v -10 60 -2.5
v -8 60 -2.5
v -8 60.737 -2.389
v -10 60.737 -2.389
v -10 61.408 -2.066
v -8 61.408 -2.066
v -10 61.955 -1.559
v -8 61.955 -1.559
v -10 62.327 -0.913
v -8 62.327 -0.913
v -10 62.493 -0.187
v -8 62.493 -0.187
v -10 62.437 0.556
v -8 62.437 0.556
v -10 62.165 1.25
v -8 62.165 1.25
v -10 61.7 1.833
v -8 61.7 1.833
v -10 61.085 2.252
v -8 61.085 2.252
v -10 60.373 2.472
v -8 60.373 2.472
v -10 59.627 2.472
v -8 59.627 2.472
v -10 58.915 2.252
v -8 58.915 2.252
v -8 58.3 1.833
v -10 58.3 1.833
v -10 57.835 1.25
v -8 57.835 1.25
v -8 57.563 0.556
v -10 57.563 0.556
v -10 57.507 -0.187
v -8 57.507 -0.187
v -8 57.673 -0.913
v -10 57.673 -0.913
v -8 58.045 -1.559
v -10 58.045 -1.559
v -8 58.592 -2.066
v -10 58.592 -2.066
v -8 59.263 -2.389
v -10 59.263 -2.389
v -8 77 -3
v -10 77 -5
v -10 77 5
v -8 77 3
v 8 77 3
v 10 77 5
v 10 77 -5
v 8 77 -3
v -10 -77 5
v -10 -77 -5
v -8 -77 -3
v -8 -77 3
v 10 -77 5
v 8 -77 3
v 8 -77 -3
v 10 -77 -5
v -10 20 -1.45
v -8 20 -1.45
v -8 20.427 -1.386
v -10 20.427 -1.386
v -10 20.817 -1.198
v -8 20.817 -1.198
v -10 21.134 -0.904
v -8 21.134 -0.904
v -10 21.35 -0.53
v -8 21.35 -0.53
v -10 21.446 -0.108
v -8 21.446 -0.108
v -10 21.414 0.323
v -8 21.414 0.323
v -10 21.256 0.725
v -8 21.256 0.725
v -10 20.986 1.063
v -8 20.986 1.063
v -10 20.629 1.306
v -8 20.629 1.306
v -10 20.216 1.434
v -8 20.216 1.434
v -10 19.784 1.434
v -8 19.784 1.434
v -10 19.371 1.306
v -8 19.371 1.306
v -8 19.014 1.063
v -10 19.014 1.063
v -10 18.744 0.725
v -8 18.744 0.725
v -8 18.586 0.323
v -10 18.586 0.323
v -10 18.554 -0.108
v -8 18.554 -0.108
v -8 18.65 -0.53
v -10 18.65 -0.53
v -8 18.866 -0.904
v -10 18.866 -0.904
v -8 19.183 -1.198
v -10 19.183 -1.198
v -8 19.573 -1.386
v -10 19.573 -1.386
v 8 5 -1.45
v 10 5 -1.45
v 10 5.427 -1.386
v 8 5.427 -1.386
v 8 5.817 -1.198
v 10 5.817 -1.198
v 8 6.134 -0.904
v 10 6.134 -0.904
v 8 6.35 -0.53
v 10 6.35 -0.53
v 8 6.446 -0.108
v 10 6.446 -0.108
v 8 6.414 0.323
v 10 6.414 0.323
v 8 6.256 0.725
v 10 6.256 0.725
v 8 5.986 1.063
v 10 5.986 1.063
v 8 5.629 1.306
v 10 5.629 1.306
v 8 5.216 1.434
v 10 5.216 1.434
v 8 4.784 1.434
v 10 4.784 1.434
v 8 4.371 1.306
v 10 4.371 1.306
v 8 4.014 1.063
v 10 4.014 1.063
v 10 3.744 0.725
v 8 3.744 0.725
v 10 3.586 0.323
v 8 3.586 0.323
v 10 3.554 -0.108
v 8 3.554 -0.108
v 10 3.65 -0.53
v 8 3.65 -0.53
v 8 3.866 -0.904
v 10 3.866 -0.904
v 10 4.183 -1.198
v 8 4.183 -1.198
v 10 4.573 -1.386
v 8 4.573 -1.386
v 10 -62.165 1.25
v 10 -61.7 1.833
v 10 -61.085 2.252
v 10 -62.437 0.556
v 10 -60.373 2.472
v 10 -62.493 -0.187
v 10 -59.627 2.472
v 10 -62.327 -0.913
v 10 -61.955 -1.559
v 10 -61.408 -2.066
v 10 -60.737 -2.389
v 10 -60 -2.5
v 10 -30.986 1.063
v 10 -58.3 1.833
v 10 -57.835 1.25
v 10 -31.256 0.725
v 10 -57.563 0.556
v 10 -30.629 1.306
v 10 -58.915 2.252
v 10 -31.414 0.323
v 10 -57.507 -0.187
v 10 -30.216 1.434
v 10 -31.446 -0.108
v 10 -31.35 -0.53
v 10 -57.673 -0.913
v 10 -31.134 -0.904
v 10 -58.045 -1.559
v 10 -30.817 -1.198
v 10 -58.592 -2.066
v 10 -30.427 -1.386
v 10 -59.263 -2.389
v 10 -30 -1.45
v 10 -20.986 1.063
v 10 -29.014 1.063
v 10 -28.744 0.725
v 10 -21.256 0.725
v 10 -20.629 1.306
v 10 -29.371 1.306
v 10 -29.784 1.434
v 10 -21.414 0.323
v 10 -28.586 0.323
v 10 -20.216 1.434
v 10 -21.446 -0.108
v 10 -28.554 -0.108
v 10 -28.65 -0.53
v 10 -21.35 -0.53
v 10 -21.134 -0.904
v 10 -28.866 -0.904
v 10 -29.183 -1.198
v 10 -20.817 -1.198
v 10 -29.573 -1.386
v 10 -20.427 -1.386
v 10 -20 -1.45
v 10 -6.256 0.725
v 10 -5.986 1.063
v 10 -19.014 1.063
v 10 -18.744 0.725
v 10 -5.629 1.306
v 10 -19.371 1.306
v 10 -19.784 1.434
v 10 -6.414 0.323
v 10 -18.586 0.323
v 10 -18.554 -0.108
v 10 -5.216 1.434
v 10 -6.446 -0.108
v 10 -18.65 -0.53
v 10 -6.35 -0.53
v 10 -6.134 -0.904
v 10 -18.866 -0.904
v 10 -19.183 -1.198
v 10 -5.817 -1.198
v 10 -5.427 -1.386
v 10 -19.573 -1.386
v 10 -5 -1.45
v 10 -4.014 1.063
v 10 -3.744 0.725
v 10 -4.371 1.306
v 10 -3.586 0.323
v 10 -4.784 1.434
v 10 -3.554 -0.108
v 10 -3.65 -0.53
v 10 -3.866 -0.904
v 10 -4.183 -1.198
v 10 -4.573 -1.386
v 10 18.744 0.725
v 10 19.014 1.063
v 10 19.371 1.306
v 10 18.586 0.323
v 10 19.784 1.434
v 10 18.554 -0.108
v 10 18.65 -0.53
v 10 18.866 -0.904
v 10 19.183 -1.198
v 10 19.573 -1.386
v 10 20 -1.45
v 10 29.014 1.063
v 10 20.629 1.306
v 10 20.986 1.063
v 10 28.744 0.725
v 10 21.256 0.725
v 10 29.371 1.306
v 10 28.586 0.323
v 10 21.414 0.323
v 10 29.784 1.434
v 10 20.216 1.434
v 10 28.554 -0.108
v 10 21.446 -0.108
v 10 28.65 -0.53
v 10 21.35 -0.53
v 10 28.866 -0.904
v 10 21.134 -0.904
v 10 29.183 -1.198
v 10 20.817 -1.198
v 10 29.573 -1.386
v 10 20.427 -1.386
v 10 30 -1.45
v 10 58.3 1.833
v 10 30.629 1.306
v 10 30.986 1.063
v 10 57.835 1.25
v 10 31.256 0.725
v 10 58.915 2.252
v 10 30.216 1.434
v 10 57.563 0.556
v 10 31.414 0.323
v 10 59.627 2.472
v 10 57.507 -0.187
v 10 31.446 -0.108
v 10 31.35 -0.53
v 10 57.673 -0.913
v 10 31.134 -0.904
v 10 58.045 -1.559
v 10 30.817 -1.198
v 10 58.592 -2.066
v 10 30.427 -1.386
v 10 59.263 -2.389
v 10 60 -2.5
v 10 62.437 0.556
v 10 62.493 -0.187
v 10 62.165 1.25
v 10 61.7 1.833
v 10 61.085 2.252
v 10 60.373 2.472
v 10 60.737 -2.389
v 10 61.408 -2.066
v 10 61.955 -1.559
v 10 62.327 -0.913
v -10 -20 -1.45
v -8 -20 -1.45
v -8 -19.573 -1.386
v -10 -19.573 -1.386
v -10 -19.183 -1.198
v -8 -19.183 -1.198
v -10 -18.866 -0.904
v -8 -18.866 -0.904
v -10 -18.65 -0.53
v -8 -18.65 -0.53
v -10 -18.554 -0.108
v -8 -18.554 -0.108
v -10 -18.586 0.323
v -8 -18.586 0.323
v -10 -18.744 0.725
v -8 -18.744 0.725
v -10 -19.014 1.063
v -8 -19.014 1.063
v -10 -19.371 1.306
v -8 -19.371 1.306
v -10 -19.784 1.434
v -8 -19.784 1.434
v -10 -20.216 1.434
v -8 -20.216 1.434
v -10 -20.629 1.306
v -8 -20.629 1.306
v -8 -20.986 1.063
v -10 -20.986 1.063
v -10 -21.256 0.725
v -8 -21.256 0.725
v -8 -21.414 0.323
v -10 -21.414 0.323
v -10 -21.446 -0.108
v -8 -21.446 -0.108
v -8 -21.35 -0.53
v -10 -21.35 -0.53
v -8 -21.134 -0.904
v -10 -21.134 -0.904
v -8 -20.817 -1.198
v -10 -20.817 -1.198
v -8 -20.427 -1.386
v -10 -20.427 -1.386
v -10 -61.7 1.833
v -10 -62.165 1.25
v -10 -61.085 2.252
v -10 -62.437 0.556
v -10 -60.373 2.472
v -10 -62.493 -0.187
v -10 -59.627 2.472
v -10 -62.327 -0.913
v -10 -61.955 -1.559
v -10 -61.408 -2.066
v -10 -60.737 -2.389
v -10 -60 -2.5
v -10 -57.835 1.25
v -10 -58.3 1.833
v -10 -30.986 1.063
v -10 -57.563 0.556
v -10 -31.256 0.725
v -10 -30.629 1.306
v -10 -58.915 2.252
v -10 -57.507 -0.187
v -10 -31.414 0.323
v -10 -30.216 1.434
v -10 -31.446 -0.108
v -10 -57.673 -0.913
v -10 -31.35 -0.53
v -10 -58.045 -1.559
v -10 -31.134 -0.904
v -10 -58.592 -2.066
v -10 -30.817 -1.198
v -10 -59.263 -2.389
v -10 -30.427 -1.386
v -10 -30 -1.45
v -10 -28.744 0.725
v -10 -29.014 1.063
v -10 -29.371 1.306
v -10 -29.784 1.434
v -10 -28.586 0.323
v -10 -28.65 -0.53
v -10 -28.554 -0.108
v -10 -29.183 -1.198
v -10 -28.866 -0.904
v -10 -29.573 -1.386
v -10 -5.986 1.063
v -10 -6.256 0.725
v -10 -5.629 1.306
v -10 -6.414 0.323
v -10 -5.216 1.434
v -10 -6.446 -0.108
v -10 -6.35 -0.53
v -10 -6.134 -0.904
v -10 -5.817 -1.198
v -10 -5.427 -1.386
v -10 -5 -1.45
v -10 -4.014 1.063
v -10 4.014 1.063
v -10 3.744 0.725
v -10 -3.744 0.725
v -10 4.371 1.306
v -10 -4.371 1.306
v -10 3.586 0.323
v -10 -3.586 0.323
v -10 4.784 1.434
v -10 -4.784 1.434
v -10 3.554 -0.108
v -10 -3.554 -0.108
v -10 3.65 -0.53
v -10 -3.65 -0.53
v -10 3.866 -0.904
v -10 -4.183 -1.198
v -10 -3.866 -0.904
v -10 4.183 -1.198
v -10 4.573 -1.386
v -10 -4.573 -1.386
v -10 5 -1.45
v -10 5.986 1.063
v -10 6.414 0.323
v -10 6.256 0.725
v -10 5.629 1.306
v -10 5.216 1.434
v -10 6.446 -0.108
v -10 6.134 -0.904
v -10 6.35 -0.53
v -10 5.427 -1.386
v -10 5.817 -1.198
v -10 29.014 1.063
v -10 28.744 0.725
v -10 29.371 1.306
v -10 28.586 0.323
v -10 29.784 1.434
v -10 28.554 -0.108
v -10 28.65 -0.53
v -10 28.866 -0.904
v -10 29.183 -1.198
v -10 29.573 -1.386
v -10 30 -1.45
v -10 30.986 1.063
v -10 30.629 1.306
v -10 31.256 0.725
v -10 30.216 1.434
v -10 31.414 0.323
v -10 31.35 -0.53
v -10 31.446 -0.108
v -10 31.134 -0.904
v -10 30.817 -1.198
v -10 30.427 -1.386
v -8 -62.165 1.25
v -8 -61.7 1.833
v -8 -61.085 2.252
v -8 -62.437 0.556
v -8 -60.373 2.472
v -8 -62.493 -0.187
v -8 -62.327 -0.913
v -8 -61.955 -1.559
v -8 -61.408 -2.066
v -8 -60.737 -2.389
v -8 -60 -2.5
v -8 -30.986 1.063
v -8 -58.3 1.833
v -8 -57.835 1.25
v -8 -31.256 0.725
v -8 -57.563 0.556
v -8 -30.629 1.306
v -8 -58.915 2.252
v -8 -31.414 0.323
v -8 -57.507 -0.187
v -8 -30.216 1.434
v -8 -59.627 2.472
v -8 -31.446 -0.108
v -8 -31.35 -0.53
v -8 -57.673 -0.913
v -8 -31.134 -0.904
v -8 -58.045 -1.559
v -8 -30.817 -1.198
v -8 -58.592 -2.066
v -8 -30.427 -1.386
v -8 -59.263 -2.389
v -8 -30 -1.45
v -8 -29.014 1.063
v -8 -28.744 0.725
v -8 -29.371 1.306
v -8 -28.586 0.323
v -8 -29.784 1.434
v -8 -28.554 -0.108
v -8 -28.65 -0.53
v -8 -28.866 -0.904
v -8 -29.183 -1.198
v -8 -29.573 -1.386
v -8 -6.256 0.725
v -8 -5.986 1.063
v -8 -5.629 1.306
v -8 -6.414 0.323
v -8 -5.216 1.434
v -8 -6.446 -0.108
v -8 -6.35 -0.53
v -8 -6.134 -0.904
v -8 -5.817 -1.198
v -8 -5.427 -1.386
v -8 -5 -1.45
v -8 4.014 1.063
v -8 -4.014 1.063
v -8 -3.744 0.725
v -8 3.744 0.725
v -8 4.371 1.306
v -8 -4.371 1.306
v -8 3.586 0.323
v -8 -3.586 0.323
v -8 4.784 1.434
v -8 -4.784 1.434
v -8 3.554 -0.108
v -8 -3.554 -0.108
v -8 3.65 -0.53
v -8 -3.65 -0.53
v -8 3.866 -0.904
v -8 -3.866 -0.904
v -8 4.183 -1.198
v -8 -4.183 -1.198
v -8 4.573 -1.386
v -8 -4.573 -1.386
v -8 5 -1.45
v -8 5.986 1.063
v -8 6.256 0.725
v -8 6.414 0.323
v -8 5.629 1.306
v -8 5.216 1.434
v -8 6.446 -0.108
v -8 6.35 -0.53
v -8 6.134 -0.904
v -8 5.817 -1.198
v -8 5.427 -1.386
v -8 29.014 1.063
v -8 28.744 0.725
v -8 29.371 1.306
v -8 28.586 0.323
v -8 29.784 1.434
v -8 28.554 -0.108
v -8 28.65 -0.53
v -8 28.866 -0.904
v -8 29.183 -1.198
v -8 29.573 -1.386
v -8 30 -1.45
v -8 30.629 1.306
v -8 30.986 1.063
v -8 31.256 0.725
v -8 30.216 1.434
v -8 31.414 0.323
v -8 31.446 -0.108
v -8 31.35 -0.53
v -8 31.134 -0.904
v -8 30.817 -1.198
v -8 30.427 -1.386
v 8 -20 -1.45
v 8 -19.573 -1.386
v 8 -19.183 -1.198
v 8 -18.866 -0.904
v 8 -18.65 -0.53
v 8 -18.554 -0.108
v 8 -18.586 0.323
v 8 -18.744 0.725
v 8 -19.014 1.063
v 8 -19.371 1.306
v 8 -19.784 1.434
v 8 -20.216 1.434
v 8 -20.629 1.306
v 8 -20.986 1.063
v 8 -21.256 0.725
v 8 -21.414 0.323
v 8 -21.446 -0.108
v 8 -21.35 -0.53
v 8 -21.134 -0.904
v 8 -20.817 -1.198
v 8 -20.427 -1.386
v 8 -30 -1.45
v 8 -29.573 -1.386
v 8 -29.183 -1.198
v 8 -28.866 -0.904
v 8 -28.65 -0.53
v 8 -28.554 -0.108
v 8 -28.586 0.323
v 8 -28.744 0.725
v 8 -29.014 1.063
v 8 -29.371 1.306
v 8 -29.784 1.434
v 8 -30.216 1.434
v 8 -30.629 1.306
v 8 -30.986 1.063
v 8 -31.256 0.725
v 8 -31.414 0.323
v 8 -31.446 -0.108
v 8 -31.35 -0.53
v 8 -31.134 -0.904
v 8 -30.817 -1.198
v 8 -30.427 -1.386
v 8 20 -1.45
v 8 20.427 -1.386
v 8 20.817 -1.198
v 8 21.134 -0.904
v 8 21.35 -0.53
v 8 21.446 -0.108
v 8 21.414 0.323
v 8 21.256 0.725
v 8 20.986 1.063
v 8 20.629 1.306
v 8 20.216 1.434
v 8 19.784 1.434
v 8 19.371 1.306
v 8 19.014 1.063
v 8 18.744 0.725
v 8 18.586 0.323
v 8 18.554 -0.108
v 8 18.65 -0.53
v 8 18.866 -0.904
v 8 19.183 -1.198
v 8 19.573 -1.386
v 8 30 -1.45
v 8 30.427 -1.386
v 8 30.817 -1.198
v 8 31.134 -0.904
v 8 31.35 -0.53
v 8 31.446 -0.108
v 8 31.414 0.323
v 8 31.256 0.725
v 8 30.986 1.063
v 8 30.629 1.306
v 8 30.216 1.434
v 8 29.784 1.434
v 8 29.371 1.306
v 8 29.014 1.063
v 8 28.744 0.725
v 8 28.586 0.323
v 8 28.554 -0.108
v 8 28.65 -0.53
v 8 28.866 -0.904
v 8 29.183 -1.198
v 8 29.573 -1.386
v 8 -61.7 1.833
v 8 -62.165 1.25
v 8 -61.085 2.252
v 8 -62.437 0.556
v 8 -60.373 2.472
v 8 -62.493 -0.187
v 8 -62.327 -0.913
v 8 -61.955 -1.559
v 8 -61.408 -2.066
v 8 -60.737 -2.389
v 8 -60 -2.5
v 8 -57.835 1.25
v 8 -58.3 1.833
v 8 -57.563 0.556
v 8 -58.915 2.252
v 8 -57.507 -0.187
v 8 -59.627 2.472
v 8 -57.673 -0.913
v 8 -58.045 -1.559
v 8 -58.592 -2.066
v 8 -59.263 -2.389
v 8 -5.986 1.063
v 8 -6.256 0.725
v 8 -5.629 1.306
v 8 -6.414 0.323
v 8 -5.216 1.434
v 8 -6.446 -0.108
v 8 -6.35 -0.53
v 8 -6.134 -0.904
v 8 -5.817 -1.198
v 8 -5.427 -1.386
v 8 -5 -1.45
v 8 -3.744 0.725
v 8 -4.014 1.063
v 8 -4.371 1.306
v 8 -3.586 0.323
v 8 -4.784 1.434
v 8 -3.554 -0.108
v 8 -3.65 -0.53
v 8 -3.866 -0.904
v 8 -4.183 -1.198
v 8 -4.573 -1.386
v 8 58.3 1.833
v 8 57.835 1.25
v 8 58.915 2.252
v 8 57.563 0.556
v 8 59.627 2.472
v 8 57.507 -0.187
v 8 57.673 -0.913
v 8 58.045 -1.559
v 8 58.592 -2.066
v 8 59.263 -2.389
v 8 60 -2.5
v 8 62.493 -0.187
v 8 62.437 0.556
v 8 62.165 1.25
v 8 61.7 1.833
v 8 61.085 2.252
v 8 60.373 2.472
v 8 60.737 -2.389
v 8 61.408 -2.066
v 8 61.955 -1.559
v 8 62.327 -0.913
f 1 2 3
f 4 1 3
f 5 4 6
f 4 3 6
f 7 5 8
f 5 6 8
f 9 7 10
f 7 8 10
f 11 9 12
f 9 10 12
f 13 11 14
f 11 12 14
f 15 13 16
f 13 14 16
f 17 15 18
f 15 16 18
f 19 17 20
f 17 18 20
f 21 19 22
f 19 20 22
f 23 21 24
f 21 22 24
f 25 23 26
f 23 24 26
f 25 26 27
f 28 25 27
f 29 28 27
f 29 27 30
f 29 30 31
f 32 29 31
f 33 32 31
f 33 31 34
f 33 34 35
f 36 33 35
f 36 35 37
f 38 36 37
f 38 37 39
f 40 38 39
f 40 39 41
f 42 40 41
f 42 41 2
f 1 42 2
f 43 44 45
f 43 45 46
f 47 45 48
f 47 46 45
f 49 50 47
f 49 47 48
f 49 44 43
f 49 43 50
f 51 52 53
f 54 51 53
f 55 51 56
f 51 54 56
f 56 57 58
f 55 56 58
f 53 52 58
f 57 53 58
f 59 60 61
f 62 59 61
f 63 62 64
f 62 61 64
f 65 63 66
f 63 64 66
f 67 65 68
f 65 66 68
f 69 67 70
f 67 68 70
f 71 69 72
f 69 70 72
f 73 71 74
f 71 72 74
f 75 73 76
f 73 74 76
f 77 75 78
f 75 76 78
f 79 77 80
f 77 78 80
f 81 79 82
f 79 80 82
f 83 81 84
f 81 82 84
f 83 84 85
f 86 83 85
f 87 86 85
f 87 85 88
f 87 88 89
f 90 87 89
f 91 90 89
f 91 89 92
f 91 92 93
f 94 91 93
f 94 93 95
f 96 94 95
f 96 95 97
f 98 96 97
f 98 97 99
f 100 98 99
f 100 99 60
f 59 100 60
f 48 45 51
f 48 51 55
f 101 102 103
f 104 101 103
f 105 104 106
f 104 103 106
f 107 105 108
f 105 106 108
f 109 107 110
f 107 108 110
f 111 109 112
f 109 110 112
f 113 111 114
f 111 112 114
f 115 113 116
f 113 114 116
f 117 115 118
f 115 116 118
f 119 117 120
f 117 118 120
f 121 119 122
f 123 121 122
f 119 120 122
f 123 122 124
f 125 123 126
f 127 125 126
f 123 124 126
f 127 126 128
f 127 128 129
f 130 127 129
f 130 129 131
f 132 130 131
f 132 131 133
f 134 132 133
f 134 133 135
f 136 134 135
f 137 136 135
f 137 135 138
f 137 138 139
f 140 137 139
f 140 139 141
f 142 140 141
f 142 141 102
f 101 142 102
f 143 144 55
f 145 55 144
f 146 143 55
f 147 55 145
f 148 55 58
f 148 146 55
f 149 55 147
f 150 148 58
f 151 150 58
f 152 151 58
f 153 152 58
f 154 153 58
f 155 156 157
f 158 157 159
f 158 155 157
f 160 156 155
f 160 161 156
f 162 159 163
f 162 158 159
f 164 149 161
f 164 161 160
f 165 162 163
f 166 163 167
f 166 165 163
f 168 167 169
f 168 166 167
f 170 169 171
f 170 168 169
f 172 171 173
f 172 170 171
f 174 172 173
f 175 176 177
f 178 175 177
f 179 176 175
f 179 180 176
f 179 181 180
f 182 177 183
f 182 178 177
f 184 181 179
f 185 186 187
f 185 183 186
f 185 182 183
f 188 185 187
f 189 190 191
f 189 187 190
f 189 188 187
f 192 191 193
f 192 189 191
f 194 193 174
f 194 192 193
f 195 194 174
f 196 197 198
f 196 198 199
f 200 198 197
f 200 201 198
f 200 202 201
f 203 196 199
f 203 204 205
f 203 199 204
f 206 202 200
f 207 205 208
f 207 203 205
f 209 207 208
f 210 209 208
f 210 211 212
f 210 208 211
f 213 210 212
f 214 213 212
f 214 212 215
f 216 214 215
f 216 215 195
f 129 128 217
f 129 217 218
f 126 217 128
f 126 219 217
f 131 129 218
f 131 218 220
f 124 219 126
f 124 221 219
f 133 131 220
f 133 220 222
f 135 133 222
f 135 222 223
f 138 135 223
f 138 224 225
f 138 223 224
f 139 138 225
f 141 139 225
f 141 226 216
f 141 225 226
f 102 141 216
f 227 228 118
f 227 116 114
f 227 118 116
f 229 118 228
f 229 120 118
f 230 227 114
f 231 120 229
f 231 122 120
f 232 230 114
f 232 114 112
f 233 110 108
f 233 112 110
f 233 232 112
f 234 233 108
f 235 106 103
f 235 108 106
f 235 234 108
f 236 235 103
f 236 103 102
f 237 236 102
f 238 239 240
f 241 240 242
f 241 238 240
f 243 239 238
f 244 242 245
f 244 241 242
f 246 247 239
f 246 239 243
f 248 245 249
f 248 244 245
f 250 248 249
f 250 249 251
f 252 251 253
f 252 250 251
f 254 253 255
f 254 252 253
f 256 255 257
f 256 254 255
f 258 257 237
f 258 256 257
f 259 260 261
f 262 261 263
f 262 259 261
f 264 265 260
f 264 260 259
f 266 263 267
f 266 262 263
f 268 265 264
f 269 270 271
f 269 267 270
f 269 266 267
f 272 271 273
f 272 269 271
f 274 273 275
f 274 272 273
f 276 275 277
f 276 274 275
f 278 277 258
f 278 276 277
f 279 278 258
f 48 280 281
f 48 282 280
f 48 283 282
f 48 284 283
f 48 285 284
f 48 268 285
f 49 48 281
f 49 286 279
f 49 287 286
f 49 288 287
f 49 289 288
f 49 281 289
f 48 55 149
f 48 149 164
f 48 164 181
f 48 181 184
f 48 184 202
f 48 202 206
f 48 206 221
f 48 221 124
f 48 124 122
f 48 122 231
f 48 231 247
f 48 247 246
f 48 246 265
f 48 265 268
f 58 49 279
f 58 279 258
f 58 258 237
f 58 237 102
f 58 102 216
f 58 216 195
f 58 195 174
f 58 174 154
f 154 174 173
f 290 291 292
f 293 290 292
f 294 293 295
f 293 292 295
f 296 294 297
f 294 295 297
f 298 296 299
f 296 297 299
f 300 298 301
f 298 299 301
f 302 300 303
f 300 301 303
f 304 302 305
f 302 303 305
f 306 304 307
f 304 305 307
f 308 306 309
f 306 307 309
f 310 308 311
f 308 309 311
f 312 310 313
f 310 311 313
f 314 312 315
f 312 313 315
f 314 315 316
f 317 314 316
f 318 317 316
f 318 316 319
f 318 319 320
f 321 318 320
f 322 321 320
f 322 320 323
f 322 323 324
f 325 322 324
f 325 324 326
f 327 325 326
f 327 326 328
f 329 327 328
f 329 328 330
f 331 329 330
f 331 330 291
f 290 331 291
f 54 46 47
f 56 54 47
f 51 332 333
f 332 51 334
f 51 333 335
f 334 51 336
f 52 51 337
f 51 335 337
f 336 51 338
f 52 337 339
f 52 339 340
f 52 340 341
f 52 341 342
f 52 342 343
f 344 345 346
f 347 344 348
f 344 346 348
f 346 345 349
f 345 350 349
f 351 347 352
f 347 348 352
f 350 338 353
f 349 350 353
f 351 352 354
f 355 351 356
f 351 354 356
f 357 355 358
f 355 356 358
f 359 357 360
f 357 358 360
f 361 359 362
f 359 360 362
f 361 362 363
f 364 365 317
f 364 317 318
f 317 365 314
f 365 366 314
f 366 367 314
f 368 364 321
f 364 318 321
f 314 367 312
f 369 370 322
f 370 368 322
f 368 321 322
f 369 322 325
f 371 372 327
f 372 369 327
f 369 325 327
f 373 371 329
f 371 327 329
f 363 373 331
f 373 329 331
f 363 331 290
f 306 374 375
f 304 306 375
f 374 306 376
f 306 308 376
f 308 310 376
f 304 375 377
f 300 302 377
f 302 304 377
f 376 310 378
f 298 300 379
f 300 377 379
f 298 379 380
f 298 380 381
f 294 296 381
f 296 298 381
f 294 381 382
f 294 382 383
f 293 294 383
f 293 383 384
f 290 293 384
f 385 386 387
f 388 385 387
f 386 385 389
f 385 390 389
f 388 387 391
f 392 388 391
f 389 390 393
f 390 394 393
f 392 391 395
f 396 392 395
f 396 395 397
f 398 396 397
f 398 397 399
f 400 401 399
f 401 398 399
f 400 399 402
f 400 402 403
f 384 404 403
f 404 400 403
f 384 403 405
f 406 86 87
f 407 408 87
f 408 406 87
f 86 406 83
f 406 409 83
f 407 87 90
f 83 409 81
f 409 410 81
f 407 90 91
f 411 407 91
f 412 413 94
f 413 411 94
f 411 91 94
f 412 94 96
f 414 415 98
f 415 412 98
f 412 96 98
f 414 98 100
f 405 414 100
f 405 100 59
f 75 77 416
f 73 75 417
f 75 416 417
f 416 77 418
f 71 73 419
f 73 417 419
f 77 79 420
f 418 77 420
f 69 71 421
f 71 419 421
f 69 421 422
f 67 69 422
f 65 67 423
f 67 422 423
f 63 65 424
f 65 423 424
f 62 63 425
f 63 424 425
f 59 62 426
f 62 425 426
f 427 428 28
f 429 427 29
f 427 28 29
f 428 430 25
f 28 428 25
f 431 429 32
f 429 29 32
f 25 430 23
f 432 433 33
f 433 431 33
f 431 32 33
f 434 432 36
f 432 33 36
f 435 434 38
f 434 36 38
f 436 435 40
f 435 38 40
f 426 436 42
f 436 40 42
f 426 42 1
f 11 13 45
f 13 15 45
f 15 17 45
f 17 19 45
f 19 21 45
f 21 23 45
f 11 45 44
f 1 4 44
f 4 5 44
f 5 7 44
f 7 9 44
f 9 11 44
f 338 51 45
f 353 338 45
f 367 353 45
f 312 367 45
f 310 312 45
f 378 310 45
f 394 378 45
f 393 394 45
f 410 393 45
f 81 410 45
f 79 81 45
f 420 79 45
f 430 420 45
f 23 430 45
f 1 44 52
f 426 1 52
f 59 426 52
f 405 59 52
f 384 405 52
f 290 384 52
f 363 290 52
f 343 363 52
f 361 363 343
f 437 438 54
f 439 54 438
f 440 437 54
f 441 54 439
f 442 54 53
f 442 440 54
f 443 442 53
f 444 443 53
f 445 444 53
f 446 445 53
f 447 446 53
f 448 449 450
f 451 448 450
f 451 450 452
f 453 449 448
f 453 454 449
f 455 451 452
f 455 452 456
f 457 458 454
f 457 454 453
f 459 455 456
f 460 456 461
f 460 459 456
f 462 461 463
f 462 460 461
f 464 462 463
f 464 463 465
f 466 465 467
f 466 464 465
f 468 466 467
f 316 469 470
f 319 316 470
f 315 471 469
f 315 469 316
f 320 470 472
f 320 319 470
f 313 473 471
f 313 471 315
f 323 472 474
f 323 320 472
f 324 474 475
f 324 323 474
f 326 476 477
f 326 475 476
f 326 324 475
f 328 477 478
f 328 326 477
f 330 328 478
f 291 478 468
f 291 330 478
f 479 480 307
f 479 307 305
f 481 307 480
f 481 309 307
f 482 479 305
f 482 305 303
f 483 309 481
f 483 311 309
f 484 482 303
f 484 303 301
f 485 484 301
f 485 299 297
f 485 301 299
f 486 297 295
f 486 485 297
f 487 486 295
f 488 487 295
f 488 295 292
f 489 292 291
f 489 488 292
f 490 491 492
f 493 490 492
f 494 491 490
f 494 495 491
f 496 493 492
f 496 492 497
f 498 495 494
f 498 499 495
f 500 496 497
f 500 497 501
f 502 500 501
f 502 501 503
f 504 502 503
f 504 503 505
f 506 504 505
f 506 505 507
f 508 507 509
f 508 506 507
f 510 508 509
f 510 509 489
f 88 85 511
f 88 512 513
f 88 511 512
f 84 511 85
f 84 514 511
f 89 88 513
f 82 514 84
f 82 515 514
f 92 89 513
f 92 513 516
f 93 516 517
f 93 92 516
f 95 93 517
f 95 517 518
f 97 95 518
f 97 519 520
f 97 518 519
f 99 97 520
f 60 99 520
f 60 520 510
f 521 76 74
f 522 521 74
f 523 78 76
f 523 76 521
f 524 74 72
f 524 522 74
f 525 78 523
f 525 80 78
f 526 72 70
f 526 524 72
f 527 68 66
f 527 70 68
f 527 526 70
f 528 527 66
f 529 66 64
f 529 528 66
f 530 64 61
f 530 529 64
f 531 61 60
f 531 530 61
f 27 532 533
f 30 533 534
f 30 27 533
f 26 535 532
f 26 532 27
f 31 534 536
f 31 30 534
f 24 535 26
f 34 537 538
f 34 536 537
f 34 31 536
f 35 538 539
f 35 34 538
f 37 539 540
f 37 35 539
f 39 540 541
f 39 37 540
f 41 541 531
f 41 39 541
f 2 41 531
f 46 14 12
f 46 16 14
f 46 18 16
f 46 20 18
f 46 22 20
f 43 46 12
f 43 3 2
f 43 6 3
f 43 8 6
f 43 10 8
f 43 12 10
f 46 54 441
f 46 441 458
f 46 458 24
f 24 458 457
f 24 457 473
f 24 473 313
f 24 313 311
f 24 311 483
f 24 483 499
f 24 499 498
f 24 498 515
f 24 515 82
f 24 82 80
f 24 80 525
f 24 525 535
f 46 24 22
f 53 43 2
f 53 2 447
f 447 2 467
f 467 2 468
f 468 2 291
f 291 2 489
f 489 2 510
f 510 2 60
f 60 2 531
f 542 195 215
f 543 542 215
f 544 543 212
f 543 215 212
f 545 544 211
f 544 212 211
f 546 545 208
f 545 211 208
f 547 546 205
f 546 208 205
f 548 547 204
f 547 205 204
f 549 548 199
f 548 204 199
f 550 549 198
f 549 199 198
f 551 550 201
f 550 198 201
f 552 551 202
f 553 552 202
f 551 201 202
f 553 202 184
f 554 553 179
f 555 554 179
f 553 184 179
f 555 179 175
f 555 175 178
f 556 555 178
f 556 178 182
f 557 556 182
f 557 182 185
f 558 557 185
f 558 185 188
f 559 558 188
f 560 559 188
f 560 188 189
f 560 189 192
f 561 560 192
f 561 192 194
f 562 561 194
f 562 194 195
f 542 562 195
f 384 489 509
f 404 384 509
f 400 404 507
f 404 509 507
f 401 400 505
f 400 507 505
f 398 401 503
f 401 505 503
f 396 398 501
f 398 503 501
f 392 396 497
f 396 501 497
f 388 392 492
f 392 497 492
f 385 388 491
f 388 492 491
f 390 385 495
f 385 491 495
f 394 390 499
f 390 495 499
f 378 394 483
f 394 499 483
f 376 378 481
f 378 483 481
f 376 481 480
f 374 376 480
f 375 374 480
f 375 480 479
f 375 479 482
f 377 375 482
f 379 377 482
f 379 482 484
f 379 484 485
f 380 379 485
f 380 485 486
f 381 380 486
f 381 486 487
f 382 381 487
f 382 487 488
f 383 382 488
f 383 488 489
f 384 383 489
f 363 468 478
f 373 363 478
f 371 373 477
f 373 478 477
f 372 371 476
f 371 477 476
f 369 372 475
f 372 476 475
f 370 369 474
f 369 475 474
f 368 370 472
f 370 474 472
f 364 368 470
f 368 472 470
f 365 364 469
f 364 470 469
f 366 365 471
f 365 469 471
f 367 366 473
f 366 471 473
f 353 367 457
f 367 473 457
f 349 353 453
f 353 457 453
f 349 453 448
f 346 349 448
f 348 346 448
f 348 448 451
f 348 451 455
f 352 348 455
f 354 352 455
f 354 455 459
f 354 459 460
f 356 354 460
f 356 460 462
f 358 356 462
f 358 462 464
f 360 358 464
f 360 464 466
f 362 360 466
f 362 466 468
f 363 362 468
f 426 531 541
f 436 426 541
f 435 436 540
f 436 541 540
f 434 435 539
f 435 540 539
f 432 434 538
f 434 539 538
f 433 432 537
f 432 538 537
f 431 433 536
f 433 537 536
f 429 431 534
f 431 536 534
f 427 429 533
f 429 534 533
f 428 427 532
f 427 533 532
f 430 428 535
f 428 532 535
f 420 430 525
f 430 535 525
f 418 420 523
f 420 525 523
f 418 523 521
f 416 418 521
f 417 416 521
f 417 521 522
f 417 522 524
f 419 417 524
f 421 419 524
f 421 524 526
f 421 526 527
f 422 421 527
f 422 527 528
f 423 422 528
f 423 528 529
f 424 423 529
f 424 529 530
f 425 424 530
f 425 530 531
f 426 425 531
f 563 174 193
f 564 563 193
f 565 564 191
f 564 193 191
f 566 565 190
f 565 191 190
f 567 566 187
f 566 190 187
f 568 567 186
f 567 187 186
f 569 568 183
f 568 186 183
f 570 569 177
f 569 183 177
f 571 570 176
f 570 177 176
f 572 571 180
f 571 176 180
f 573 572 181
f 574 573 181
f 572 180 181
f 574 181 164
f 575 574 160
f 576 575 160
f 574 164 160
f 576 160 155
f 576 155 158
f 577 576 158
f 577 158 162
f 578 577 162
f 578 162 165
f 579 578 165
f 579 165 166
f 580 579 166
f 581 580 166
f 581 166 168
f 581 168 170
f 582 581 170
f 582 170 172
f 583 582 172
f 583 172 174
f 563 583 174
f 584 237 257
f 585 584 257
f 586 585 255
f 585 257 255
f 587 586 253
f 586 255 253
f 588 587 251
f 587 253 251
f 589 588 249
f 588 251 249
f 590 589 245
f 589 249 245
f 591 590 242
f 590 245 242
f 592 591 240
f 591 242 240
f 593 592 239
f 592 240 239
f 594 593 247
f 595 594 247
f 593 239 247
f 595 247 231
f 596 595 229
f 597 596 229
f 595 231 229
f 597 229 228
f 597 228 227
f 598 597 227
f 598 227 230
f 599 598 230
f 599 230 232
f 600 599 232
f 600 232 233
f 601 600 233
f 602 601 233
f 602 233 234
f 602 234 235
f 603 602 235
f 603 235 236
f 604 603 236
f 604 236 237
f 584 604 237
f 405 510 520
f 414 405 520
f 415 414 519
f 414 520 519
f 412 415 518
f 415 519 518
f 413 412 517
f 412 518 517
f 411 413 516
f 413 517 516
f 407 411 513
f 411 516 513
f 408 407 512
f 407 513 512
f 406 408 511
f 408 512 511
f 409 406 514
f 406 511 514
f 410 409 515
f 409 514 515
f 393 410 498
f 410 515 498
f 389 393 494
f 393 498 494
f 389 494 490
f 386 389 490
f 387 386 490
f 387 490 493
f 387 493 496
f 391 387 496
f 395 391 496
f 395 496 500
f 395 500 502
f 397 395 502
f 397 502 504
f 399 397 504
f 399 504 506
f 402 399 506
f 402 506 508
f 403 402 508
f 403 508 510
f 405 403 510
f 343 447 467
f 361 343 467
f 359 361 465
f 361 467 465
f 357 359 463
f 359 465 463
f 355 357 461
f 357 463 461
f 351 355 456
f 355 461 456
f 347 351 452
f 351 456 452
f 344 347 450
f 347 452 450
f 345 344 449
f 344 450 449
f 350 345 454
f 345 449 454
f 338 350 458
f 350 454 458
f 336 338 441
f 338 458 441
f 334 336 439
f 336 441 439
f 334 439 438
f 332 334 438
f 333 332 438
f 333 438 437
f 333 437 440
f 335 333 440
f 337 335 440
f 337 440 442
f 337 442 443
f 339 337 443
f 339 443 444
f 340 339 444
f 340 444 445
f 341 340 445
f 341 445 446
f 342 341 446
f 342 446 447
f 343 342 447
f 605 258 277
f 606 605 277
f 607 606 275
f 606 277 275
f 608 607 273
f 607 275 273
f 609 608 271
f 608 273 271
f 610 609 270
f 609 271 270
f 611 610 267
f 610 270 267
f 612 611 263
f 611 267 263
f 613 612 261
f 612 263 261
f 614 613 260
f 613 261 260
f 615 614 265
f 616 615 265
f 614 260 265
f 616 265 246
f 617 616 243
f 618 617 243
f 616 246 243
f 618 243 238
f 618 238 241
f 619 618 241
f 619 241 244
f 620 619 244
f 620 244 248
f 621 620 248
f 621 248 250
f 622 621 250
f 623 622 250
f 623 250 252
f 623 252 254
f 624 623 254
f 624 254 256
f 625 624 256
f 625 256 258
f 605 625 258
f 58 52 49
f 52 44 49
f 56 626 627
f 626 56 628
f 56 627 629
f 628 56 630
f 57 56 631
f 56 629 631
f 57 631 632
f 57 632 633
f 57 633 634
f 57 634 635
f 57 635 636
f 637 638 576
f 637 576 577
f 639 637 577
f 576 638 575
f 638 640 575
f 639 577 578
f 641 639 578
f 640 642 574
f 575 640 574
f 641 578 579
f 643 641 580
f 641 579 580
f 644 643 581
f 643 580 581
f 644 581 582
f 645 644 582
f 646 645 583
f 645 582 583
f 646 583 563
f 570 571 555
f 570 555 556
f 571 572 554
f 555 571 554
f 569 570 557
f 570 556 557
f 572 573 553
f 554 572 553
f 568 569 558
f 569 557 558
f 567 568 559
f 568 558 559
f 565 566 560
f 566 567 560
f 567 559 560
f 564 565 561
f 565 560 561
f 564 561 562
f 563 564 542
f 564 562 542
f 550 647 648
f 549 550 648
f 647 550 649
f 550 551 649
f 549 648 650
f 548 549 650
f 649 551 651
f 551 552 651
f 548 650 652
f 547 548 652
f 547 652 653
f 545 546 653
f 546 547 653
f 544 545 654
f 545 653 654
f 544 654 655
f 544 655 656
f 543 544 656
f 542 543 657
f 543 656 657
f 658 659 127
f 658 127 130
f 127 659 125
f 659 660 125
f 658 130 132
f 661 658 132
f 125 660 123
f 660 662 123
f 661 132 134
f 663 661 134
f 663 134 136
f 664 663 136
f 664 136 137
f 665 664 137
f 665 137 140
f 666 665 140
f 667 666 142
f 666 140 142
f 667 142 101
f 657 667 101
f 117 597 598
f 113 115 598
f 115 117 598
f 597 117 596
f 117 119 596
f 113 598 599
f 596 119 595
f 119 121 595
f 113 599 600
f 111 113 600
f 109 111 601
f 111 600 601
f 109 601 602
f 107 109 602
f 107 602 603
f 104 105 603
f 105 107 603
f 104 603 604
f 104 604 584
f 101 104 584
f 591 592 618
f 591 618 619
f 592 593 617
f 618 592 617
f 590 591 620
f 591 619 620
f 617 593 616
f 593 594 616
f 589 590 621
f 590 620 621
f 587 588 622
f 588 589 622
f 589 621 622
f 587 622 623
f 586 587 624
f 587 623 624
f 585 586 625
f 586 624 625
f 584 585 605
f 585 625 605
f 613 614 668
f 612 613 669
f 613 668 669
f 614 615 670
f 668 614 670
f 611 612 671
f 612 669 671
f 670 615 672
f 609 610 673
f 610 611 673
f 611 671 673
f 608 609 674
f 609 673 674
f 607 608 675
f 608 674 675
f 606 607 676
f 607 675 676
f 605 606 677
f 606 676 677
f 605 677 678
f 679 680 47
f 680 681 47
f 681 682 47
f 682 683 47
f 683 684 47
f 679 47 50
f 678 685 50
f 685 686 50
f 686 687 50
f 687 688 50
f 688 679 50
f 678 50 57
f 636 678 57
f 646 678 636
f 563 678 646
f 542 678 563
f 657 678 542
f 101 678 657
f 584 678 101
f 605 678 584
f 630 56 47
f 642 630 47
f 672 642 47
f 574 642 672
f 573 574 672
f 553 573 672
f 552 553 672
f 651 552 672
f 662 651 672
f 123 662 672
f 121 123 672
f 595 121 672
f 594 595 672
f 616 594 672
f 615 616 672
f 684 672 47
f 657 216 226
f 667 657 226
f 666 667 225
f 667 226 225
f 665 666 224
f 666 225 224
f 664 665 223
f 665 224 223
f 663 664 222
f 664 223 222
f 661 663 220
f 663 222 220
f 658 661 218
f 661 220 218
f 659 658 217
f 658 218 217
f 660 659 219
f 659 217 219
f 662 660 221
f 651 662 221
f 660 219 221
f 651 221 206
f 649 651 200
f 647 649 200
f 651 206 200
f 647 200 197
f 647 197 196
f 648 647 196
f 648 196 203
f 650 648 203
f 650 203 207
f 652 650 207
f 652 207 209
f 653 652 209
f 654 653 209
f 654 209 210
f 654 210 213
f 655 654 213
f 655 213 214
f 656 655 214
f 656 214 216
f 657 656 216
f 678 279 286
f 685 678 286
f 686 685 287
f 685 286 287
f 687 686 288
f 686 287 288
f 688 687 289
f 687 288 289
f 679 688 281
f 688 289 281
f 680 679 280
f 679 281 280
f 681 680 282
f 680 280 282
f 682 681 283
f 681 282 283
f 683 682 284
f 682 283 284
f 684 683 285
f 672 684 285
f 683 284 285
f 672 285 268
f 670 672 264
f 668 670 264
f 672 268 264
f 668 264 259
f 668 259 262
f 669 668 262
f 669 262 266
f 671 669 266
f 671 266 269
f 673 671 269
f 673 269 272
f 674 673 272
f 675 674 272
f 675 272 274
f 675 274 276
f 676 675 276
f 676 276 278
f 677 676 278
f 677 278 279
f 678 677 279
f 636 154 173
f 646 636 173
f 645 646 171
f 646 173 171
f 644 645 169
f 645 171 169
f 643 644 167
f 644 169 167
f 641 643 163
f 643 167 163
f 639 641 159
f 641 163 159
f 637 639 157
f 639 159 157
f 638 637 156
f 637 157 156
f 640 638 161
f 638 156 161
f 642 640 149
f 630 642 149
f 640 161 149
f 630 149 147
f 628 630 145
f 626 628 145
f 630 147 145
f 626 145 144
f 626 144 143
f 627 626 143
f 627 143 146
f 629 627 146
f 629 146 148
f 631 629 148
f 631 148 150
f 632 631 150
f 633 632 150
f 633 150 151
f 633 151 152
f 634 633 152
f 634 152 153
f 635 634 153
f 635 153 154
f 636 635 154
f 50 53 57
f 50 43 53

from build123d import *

# Parameters (mm, degrees)
SKETCH_1_W          = 20
SKETCH_1_H          = 10
SKETCH_1_W_2        = 16
SKETCH_1_H_2        = 6
EXTRUDE_1_DEPTH     = 77
SKETCH_2_R          = 1.45
SKETCH_2_R_2        = 2.5
CUT_EXTRUDE_1_DEPTH = 80.711981534


with BuildPart() as part:
    # 草图1 → 凸台-拉伸1 (new, symmetric)
    with BuildSketch(Plane(origin=(0, 0, 0), x_dir=(1, 0, 0), z_dir=(0, 1, 0))):
        Rectangle(SKETCH_1_W, SKETCH_1_H)
        Rectangle(SKETCH_1_W_2, SKETCH_1_H_2, mode=Mode.SUBTRACT)
    extrude(amount=EXTRUDE_1_DEPTH, both=True)

    # 草图2 → 切除-拉伸1 (cut, through all)
    with BuildSketch(Plane(origin=(10, 0, 0), x_dir=(0, 0, -1), z_dir=(1, 0, 0))):
        with Locations((0, 5)):
            Circle(SKETCH_2_R)
        with Locations((0, 20)):
            Circle(SKETCH_2_R)
        with Locations((0, 30)):
            Circle(SKETCH_2_R)
        with Locations((0, -30)):
            Circle(SKETCH_2_R)
        with Locations((0, -20)):
            Circle(SKETCH_2_R)
        with Locations((0, -5)):
            Circle(SKETCH_2_R)
        with Locations((0, 60)):
            Circle(SKETCH_2_R_2)
        with Locations((0, -60)):
            Circle(SKETCH_2_R_2)
    extrude(amount=-CUT_EXTRUDE_1_DEPTH, mode=Mode.SUBTRACT)


solid = part.part
